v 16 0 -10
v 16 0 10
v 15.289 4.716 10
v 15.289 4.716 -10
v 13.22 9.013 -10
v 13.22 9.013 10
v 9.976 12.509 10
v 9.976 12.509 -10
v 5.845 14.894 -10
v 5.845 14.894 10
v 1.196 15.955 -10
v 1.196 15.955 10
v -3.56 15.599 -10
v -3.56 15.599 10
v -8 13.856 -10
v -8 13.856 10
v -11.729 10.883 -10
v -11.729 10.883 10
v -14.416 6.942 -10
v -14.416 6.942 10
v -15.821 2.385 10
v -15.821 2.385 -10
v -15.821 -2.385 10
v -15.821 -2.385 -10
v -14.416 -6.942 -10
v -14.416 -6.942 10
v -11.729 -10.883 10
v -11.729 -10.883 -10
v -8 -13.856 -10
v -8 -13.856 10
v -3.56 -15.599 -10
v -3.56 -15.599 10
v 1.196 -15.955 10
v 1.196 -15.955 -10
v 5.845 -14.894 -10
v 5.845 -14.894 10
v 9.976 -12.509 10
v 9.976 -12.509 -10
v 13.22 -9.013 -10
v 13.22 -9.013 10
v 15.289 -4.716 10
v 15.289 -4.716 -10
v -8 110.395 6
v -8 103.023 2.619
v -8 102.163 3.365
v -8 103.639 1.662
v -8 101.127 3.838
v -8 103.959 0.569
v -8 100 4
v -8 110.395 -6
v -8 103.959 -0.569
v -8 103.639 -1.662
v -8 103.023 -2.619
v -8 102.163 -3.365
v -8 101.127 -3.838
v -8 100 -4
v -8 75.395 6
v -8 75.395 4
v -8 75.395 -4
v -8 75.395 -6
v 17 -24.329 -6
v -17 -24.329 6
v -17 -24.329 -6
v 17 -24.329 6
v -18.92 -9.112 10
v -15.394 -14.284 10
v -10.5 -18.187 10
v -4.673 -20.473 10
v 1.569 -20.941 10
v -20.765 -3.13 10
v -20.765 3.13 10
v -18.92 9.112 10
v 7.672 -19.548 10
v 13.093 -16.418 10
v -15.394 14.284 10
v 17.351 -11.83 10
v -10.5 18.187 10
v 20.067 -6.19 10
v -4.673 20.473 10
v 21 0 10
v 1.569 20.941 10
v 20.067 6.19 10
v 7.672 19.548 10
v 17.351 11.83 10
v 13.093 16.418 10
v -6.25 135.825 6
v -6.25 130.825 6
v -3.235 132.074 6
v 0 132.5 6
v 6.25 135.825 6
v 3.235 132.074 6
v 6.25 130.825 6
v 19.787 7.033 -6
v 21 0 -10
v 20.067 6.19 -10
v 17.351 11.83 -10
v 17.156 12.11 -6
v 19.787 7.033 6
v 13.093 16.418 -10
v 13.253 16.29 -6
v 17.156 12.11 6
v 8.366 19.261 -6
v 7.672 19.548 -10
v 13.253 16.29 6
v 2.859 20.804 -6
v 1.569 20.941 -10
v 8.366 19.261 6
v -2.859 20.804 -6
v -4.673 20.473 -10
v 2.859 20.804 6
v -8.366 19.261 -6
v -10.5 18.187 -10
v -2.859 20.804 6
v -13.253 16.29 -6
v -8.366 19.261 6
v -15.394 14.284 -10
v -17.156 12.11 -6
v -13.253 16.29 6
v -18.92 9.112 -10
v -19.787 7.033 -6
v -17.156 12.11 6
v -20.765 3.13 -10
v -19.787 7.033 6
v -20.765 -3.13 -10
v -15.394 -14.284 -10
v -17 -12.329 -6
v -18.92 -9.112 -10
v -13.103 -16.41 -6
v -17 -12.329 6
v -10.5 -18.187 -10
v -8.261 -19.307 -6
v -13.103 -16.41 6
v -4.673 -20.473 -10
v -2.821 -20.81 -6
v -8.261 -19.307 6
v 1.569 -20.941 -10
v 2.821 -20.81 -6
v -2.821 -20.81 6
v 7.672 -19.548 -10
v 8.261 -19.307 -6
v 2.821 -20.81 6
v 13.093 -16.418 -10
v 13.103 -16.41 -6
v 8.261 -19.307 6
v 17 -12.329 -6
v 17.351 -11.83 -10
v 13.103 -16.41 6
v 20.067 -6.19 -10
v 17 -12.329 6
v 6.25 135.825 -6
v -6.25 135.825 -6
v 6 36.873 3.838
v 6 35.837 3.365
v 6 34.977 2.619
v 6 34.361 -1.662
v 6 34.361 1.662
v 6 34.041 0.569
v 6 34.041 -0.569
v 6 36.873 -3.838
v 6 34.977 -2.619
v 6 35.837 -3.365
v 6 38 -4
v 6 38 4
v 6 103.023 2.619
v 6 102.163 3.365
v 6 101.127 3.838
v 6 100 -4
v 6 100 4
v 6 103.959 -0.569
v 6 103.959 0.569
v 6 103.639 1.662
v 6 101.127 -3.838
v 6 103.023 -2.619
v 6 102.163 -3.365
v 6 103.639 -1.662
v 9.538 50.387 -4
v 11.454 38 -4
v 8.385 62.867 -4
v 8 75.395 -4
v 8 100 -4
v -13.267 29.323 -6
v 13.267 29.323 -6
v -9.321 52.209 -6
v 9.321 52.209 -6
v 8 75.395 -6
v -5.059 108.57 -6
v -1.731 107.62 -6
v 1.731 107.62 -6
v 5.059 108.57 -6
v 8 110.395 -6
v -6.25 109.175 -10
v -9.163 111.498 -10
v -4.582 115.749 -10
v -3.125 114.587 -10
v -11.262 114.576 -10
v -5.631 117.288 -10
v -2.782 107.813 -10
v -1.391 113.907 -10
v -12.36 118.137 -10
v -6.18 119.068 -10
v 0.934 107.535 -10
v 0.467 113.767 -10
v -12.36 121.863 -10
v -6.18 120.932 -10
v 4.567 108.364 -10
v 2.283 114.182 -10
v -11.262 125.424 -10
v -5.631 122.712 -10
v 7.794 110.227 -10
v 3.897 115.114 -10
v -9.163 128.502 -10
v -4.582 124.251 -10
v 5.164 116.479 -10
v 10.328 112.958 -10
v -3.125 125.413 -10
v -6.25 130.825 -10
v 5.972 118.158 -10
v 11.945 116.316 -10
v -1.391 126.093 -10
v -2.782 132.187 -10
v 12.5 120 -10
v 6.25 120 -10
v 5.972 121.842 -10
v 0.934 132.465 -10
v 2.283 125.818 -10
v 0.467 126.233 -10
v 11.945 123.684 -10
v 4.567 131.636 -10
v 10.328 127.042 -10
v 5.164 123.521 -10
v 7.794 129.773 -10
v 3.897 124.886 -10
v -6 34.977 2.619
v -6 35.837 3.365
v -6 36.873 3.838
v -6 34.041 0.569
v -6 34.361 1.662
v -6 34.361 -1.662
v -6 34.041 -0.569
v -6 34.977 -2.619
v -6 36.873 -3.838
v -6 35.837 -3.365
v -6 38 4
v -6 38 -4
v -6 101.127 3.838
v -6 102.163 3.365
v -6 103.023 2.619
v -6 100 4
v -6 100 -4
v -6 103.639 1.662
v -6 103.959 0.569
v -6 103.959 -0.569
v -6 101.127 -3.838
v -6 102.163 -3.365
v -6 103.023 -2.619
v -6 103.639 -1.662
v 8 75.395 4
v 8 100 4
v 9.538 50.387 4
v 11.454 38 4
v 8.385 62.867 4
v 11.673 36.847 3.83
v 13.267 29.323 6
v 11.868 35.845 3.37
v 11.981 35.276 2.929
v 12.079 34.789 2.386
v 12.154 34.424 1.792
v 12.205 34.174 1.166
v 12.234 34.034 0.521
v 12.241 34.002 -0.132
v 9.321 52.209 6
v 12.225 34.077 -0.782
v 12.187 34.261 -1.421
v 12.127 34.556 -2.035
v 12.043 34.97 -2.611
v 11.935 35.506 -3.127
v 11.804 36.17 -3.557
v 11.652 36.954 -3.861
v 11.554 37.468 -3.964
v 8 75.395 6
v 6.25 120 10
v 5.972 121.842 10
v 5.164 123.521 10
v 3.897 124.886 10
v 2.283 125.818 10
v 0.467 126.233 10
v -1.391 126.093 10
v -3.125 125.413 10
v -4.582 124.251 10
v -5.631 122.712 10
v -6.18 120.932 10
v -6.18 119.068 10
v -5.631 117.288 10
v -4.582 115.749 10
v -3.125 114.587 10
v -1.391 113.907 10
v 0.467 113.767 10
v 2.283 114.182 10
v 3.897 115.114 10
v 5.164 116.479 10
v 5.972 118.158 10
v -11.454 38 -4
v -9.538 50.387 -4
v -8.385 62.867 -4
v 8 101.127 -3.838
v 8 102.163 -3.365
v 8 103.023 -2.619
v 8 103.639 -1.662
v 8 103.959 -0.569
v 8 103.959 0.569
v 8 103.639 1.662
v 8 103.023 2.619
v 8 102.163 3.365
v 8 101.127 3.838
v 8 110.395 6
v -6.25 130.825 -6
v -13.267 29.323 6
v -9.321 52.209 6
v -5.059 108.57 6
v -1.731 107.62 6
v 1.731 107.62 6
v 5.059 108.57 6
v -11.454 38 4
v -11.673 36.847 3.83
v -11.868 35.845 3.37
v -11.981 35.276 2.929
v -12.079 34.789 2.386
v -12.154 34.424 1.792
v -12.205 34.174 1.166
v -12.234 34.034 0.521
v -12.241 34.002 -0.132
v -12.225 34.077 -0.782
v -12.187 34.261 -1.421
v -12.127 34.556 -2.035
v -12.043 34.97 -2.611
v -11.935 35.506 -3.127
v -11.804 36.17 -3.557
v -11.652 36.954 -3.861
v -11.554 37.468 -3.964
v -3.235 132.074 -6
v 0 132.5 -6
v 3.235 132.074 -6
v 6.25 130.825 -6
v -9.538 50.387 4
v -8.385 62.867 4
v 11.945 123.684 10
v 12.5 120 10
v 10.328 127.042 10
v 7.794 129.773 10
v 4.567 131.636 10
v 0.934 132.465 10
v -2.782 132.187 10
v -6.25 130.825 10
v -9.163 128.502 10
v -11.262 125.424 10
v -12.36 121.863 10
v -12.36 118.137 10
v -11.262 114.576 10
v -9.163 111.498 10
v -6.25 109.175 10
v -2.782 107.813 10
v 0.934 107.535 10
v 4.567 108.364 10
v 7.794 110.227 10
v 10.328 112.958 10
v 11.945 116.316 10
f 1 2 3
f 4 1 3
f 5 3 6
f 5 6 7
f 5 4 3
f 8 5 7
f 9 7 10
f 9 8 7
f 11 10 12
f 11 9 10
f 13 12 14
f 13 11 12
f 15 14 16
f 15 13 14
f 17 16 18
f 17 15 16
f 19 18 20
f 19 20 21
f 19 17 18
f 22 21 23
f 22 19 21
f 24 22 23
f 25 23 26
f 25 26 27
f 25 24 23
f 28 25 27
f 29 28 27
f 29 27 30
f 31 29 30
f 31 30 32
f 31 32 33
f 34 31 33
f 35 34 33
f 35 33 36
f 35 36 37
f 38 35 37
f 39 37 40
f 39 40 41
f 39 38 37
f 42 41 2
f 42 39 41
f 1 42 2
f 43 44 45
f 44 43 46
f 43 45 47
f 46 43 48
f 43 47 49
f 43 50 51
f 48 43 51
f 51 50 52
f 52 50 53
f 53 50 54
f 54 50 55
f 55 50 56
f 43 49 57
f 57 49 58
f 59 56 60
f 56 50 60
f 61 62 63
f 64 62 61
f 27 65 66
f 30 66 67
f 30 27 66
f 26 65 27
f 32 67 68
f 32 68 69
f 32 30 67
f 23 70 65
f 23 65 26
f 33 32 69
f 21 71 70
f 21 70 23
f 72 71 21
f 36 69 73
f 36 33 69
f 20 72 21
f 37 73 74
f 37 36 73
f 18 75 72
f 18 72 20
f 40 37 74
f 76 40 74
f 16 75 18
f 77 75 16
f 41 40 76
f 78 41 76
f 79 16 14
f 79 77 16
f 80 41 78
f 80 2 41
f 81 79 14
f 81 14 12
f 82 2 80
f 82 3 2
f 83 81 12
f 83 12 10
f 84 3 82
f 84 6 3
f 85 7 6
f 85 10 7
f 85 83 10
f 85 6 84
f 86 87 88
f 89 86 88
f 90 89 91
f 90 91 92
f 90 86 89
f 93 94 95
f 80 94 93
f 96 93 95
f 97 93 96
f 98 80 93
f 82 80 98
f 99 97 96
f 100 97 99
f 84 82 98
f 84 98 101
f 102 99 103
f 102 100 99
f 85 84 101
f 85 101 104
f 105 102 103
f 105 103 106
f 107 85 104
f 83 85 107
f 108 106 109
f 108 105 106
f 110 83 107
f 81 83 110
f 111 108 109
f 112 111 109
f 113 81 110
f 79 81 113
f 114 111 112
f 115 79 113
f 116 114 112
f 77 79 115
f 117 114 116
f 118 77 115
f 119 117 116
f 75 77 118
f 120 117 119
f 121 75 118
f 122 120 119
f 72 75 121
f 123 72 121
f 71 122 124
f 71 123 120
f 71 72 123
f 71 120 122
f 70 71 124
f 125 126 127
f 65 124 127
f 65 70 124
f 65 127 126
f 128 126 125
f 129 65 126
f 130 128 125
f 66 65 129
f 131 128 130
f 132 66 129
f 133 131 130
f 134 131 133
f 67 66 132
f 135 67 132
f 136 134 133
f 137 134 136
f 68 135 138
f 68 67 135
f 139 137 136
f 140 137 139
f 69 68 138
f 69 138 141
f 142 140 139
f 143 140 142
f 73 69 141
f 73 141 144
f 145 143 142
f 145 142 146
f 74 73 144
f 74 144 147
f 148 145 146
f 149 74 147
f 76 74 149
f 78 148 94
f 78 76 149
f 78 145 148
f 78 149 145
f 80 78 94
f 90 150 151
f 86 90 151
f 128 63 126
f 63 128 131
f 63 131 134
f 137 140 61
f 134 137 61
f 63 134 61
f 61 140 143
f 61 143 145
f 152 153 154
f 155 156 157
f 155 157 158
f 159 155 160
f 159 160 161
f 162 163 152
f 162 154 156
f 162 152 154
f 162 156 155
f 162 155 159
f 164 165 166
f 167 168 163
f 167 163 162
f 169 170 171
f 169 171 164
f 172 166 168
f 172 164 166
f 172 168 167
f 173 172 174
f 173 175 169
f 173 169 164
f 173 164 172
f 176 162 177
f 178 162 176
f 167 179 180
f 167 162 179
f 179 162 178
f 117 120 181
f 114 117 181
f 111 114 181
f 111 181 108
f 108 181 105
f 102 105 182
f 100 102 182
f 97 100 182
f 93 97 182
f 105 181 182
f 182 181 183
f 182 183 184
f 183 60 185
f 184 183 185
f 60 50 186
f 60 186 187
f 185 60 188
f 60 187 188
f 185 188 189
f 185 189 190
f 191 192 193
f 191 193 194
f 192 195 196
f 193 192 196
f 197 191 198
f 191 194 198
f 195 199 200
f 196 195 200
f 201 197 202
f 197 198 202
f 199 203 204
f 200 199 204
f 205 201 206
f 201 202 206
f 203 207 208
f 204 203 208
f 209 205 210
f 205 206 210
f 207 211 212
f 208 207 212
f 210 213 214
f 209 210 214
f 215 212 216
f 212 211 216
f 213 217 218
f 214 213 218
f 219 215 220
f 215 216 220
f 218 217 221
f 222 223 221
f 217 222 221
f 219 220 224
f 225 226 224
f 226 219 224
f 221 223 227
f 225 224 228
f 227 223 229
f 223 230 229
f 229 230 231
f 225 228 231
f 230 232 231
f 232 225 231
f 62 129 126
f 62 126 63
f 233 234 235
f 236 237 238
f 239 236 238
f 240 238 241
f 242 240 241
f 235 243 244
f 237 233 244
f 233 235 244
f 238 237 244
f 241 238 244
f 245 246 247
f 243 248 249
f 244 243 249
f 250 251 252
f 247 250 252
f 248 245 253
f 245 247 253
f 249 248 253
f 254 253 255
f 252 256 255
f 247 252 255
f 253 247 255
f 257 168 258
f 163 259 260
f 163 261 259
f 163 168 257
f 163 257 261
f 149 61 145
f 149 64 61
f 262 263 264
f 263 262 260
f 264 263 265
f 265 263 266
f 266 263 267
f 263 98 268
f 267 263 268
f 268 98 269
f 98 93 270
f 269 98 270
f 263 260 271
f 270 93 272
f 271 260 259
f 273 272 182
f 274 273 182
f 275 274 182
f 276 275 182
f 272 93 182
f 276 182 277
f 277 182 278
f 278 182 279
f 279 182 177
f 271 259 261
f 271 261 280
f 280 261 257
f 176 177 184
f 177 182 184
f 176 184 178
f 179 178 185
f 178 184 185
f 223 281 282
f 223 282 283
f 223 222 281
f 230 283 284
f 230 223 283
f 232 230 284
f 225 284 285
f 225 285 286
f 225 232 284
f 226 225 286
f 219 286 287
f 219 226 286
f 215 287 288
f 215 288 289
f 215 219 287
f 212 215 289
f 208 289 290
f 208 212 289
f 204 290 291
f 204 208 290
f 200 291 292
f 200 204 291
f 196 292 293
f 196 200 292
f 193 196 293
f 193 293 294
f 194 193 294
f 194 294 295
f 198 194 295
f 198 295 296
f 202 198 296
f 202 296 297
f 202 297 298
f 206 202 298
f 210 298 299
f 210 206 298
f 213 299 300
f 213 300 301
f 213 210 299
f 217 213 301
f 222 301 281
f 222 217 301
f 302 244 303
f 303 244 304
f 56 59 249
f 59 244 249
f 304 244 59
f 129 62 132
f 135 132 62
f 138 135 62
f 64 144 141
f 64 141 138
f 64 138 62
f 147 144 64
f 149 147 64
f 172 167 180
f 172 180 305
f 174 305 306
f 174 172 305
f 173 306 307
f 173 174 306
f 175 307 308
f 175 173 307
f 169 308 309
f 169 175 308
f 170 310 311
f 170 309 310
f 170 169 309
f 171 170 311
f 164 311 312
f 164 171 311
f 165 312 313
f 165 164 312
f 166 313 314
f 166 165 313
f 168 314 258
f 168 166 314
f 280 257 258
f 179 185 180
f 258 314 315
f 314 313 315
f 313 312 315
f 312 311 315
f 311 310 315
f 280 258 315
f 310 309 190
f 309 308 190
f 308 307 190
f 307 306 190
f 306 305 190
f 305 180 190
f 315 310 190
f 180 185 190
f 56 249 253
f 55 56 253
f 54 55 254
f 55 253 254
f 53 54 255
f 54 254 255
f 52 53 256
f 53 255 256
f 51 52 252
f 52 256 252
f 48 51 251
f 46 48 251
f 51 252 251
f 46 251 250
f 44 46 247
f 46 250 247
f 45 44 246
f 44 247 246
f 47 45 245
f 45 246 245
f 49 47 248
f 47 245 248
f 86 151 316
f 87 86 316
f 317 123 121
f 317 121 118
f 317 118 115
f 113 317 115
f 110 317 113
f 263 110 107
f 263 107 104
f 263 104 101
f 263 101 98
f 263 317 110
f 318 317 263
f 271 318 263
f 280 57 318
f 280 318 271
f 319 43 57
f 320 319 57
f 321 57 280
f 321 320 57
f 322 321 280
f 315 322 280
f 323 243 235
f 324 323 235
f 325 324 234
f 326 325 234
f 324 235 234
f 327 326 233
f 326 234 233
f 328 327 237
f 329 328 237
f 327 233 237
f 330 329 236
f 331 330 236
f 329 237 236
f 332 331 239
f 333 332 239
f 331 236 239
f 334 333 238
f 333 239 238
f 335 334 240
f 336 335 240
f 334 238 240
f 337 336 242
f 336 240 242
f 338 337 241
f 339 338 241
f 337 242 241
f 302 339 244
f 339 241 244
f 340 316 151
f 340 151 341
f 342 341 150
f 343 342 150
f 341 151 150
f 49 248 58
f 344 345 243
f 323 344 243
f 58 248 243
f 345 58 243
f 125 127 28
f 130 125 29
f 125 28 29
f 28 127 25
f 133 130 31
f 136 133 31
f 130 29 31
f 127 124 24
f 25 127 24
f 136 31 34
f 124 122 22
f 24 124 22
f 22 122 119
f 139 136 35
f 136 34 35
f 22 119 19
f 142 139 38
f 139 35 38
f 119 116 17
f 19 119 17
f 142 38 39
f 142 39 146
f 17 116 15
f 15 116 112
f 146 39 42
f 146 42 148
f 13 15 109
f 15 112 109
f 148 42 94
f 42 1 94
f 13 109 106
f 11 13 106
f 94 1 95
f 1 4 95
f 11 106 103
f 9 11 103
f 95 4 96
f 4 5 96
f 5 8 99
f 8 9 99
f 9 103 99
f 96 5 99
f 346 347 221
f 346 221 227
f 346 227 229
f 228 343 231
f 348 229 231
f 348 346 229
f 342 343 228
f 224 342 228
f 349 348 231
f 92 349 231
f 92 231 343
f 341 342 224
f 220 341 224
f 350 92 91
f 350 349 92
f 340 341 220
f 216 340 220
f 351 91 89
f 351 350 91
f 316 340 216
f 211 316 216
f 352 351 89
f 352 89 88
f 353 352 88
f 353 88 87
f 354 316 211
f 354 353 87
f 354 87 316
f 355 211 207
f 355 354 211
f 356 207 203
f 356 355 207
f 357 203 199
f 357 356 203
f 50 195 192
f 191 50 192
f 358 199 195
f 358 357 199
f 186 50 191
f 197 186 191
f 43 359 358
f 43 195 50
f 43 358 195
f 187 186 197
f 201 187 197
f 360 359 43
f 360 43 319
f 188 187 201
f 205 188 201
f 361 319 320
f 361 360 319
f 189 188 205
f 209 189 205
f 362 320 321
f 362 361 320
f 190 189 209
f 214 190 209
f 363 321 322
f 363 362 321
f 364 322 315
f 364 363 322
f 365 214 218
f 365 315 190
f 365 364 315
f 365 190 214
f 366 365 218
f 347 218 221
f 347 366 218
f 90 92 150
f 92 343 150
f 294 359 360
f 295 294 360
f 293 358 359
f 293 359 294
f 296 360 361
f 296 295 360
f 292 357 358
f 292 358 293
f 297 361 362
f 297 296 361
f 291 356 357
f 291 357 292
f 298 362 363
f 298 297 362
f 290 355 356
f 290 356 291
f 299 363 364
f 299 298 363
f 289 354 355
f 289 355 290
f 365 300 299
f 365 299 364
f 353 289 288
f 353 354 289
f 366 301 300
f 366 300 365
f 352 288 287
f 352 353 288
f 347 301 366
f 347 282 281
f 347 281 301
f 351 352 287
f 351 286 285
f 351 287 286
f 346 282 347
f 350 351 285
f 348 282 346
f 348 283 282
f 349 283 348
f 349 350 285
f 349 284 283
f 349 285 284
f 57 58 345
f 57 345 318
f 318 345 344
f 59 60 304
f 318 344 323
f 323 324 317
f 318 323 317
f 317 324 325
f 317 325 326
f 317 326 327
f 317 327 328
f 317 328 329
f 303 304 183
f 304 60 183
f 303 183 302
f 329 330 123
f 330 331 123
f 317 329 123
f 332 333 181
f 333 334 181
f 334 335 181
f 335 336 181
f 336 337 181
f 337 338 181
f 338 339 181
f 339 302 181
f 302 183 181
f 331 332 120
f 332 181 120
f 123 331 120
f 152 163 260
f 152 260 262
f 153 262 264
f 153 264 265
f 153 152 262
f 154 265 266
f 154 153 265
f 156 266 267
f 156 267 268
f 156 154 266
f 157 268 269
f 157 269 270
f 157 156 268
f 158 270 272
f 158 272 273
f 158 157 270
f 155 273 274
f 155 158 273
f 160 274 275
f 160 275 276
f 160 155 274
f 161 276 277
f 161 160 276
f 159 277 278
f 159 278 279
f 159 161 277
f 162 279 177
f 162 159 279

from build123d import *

# Parameters (mm, degrees)
SKETCH1_R             = 12.5
SKETCH1_R_2           = 6.25
BOSS_EXTRUDE1_DEPTH   = 10
SKETCH1_R_3           = 21
SKETCH1_R_4           = 16
BOSS_EXTRUDE1_2_DEPTH = 10
BOSS_EXTRUDE2_DEPTH   = 6
CUT_EXTRUDE1_START    = 6
CUT_EXTRUDE1_DEPTH    = 132.802456026


with BuildPart() as part:
    # Sketch1 → Boss-Extrude1 (new, symmetric)
    with BuildSketch(Plane.XY):
        with Locations((0, 120)):
            Circle(SKETCH1_R)
        with Locations((0, 120)):
            Circle(SKETCH1_R_2, mode=Mode.SUBTRACT)
    extrude(amount=BOSS_EXTRUDE1_DEPTH, both=True)



with BuildPart() as body_2:
    # Sketch1 → Boss-Extrude1 2 (new, symmetric)
    with BuildSketch(Plane.XY):
        Circle(SKETCH1_R_3)
        Circle(SKETCH1_R_4, mode=Mode.SUBTRACT)
    extrude(amount=BOSS_EXTRUDE1_2_DEPTH, both=True)


with BuildPart() as part_1:
    add(part.part)

    add(body_2.part)  # Boss-Extrude2 merges body 2
    # Sketch1<3> → Boss-Extrude2 (add, symmetric)
    with BuildSketch(Plane.XY):
        with BuildLine():
            ThreePointArc((8, 110.395313644), (0, 107.5), (-8, 110.395313644))
            Line((-8, 110.395313644), (-8, 75.395313644))
            ThreePointArc((-8, 75.395313644), (-10.96842855, 40.709642053), (-19.787382488, 7.032744434))
            ThreePointArc((-19.787382488, 7.032744434), (0, 21), (19.787382488, 7.032744434))
            ThreePointArc((19.787382488, 7.032744434), (10.96842855, 40.709642053), (8, 75.395313644))
            Line((8, 75.395313644), (8, 110.395313644))
        make_face()
        with BuildLine():
            Line((-6.25, 135.825317547), (-6.25, 130.825317547))
            ThreePointArc((-6.25, 130.825317547), (0, 132.5), (6.25, 130.825317547))
            Line((6.25, 130.825317547), (6.25, 135.825317547))
            Line((6.25, 135.825317547), (-6.25, 135.825317547))
        make_face()
        with BuildLine():
            ThreePointArc((17, -12.328828006), (0, -21), (-17, -12.328828006))
            Line((-17, -12.328828006), (-17, -24.328828006))
            Line((-17, -24.328828006), (17, -24.328828006))
            Line((17, -24.328828006), (17, -12.328828006))
        make_face()
    extrude(amount=BOSS_EXTRUDE2_DEPTH, both=True)

    # Sketch2 → Cut-Extrude1 (cut, through all)
    with BuildSketch(Plane(origin=(0, 0, 0), x_dir=(0, 0, -1), z_dir=(1, 0, 0)).offset(CUT_EXTRUDE1_START)):
        with BuildLine():
            Line((4, 38), (4, 100))
            ThreePointArc((4, 100), (0, 104), (-4, 100))
            Line((-4, 100), (-4, 38))
            ThreePointArc((-4, 38), (0, 34), (4, 38))
        make_face()
    cut_extrude1 = extrude(amount=CUT_EXTRUDE1_DEPTH, mode=Mode.SUBTRACT)

    # Mirror1: Cut-Extrude1 across plane
    add(cut_extrude1.mirror(Plane(origin=(0, 0, 0), x_dir=(0, 0, 1), z_dir=(1, 0, 0))), mode=Mode.SUBTRACT)


solid = part_1.part
